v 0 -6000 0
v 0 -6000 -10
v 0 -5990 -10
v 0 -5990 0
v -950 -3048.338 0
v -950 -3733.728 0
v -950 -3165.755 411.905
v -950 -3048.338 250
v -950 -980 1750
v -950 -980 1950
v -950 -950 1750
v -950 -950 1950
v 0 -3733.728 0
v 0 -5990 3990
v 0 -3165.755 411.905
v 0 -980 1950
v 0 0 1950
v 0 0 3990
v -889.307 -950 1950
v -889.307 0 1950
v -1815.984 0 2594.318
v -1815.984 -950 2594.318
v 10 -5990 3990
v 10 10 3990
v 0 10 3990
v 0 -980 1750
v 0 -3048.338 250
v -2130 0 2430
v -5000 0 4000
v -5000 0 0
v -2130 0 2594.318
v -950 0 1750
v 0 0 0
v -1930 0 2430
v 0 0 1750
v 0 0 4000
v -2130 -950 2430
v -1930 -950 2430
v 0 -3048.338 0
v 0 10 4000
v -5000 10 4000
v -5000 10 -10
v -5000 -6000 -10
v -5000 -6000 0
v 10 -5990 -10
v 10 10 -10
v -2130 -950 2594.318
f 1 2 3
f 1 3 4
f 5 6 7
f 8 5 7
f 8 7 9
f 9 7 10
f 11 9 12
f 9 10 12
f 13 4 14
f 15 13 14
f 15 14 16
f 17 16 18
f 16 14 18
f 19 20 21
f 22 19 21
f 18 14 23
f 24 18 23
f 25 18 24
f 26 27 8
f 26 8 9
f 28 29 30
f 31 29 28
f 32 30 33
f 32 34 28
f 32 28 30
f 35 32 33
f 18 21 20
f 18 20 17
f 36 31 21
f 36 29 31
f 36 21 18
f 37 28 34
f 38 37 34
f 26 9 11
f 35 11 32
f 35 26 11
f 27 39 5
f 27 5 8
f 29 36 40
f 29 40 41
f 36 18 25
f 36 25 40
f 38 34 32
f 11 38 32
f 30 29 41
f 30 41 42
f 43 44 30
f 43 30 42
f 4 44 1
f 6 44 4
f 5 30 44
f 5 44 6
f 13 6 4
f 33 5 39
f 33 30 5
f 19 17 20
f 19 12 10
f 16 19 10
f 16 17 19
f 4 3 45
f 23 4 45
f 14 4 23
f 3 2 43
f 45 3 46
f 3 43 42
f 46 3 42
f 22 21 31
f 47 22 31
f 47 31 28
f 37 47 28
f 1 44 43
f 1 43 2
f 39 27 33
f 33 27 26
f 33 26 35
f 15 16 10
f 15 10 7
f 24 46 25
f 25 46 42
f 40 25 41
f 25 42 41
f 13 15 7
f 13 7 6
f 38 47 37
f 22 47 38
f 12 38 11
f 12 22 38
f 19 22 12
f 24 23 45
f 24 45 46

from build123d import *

# Parameters (mm, degrees)
F0_W     = 5000
F0_H     = 6000
F1_DEPTH = 10
F2_W     = 5000
F2_H     = 10
F3_DEPTH = 10
F4_W     = 6000
F4_H     = 4000
F5_DEPTH = 10
F6_DEPTH = 950
F7_DEPTH = 950


with BuildPart() as f1:
    # F0 (on Top) → F1 (new body)
    with BuildSketch(Plane.XY):
        with Locations((-2500, -3000)):
            Rectangle(F0_W, F0_H)
    extrude(amount=-F1_DEPTH)

    # F2 (on Front) → F3 (join)
    with BuildSketch(Plane.XZ):
        Polygon((-5000, 0), (0, 0), (0, 4000), (-5000, 4000), (-5000, 2604.317623), (-1815.98369, 2604.317623), (-1815.98369, 2594.317623), (-854.01986, 1925.464563), (-950, 1750), (-1930, 2430), (-2130, 2430), (-2130, 2594.317623), (-5000, 2594.317623), align=None)
        with Locations((-2500, -5)):
            Rectangle(F2_W, F2_H)
        Polygon((-854.01986, 1925.464563), (-1815.98369, 2594.317623), (-1930, 2430), (-950, 1750), align=None)
        Polygon((-1815.98369, 2594.317623), (-2130, 2594.317623), (-2130, 2430), (-1930, 2430), align=None)
        Polygon((-5000, 2604.317623), (-5000, 2594.317623), (-2130, 2594.317623), (-1815.98369, 2594.317623), (-1815.98369, 2604.317623), align=None)
    extrude(amount=-F3_DEPTH)

    # F4 (on Right) → F5 (join)
    with BuildSketch(Plane.YZ):
        with Locations((-2990, 1990)):
            Rectangle(F4_W, F4_H)
        Polygon((0, 1950), (0, 1750), (-980, 1750), (-3048.337936, 250), (-3048.337936, 0), (-3733.727509, 0), (-3165.754795, 411.905162), (-980, 1950), align=None, mode=Mode.SUBTRACT)
        Polygon((-980, 1750), (0, 1750), (0, 1950), (-980, 1950), (-3165.754795, 411.905162), (-3733.727509, 0), (-3048.337936, 0), (-3048.337936, 250), align=None)
    extrude(amount=F5_DEPTH)

    # F4 (on Right) → F6 (join)
    with BuildSketch(Plane.YZ):
        Polygon((-980, 1750), (0, 1750), (0, 1950), (-980, 1950), (-3165.754795, 411.905162), (-3733.727509, 0), (-3048.337936, 0), (-3048.337936, 250), align=None)
    extrude(amount=-F6_DEPTH)

    # F2 (on Front) → F7 (join)
    with BuildSketch(Plane.XZ):
        Polygon((-854.01986, 1925.464563), (-1815.98369, 2594.317623), (-1930, 2430), (-950, 1750), align=None)
        Polygon((-1815.98369, 2594.317623), (-2130, 2594.317623), (-2130, 2430), (-1930, 2430), align=None)
    extrude(amount=F7_DEPTH)


solid = f1.part
